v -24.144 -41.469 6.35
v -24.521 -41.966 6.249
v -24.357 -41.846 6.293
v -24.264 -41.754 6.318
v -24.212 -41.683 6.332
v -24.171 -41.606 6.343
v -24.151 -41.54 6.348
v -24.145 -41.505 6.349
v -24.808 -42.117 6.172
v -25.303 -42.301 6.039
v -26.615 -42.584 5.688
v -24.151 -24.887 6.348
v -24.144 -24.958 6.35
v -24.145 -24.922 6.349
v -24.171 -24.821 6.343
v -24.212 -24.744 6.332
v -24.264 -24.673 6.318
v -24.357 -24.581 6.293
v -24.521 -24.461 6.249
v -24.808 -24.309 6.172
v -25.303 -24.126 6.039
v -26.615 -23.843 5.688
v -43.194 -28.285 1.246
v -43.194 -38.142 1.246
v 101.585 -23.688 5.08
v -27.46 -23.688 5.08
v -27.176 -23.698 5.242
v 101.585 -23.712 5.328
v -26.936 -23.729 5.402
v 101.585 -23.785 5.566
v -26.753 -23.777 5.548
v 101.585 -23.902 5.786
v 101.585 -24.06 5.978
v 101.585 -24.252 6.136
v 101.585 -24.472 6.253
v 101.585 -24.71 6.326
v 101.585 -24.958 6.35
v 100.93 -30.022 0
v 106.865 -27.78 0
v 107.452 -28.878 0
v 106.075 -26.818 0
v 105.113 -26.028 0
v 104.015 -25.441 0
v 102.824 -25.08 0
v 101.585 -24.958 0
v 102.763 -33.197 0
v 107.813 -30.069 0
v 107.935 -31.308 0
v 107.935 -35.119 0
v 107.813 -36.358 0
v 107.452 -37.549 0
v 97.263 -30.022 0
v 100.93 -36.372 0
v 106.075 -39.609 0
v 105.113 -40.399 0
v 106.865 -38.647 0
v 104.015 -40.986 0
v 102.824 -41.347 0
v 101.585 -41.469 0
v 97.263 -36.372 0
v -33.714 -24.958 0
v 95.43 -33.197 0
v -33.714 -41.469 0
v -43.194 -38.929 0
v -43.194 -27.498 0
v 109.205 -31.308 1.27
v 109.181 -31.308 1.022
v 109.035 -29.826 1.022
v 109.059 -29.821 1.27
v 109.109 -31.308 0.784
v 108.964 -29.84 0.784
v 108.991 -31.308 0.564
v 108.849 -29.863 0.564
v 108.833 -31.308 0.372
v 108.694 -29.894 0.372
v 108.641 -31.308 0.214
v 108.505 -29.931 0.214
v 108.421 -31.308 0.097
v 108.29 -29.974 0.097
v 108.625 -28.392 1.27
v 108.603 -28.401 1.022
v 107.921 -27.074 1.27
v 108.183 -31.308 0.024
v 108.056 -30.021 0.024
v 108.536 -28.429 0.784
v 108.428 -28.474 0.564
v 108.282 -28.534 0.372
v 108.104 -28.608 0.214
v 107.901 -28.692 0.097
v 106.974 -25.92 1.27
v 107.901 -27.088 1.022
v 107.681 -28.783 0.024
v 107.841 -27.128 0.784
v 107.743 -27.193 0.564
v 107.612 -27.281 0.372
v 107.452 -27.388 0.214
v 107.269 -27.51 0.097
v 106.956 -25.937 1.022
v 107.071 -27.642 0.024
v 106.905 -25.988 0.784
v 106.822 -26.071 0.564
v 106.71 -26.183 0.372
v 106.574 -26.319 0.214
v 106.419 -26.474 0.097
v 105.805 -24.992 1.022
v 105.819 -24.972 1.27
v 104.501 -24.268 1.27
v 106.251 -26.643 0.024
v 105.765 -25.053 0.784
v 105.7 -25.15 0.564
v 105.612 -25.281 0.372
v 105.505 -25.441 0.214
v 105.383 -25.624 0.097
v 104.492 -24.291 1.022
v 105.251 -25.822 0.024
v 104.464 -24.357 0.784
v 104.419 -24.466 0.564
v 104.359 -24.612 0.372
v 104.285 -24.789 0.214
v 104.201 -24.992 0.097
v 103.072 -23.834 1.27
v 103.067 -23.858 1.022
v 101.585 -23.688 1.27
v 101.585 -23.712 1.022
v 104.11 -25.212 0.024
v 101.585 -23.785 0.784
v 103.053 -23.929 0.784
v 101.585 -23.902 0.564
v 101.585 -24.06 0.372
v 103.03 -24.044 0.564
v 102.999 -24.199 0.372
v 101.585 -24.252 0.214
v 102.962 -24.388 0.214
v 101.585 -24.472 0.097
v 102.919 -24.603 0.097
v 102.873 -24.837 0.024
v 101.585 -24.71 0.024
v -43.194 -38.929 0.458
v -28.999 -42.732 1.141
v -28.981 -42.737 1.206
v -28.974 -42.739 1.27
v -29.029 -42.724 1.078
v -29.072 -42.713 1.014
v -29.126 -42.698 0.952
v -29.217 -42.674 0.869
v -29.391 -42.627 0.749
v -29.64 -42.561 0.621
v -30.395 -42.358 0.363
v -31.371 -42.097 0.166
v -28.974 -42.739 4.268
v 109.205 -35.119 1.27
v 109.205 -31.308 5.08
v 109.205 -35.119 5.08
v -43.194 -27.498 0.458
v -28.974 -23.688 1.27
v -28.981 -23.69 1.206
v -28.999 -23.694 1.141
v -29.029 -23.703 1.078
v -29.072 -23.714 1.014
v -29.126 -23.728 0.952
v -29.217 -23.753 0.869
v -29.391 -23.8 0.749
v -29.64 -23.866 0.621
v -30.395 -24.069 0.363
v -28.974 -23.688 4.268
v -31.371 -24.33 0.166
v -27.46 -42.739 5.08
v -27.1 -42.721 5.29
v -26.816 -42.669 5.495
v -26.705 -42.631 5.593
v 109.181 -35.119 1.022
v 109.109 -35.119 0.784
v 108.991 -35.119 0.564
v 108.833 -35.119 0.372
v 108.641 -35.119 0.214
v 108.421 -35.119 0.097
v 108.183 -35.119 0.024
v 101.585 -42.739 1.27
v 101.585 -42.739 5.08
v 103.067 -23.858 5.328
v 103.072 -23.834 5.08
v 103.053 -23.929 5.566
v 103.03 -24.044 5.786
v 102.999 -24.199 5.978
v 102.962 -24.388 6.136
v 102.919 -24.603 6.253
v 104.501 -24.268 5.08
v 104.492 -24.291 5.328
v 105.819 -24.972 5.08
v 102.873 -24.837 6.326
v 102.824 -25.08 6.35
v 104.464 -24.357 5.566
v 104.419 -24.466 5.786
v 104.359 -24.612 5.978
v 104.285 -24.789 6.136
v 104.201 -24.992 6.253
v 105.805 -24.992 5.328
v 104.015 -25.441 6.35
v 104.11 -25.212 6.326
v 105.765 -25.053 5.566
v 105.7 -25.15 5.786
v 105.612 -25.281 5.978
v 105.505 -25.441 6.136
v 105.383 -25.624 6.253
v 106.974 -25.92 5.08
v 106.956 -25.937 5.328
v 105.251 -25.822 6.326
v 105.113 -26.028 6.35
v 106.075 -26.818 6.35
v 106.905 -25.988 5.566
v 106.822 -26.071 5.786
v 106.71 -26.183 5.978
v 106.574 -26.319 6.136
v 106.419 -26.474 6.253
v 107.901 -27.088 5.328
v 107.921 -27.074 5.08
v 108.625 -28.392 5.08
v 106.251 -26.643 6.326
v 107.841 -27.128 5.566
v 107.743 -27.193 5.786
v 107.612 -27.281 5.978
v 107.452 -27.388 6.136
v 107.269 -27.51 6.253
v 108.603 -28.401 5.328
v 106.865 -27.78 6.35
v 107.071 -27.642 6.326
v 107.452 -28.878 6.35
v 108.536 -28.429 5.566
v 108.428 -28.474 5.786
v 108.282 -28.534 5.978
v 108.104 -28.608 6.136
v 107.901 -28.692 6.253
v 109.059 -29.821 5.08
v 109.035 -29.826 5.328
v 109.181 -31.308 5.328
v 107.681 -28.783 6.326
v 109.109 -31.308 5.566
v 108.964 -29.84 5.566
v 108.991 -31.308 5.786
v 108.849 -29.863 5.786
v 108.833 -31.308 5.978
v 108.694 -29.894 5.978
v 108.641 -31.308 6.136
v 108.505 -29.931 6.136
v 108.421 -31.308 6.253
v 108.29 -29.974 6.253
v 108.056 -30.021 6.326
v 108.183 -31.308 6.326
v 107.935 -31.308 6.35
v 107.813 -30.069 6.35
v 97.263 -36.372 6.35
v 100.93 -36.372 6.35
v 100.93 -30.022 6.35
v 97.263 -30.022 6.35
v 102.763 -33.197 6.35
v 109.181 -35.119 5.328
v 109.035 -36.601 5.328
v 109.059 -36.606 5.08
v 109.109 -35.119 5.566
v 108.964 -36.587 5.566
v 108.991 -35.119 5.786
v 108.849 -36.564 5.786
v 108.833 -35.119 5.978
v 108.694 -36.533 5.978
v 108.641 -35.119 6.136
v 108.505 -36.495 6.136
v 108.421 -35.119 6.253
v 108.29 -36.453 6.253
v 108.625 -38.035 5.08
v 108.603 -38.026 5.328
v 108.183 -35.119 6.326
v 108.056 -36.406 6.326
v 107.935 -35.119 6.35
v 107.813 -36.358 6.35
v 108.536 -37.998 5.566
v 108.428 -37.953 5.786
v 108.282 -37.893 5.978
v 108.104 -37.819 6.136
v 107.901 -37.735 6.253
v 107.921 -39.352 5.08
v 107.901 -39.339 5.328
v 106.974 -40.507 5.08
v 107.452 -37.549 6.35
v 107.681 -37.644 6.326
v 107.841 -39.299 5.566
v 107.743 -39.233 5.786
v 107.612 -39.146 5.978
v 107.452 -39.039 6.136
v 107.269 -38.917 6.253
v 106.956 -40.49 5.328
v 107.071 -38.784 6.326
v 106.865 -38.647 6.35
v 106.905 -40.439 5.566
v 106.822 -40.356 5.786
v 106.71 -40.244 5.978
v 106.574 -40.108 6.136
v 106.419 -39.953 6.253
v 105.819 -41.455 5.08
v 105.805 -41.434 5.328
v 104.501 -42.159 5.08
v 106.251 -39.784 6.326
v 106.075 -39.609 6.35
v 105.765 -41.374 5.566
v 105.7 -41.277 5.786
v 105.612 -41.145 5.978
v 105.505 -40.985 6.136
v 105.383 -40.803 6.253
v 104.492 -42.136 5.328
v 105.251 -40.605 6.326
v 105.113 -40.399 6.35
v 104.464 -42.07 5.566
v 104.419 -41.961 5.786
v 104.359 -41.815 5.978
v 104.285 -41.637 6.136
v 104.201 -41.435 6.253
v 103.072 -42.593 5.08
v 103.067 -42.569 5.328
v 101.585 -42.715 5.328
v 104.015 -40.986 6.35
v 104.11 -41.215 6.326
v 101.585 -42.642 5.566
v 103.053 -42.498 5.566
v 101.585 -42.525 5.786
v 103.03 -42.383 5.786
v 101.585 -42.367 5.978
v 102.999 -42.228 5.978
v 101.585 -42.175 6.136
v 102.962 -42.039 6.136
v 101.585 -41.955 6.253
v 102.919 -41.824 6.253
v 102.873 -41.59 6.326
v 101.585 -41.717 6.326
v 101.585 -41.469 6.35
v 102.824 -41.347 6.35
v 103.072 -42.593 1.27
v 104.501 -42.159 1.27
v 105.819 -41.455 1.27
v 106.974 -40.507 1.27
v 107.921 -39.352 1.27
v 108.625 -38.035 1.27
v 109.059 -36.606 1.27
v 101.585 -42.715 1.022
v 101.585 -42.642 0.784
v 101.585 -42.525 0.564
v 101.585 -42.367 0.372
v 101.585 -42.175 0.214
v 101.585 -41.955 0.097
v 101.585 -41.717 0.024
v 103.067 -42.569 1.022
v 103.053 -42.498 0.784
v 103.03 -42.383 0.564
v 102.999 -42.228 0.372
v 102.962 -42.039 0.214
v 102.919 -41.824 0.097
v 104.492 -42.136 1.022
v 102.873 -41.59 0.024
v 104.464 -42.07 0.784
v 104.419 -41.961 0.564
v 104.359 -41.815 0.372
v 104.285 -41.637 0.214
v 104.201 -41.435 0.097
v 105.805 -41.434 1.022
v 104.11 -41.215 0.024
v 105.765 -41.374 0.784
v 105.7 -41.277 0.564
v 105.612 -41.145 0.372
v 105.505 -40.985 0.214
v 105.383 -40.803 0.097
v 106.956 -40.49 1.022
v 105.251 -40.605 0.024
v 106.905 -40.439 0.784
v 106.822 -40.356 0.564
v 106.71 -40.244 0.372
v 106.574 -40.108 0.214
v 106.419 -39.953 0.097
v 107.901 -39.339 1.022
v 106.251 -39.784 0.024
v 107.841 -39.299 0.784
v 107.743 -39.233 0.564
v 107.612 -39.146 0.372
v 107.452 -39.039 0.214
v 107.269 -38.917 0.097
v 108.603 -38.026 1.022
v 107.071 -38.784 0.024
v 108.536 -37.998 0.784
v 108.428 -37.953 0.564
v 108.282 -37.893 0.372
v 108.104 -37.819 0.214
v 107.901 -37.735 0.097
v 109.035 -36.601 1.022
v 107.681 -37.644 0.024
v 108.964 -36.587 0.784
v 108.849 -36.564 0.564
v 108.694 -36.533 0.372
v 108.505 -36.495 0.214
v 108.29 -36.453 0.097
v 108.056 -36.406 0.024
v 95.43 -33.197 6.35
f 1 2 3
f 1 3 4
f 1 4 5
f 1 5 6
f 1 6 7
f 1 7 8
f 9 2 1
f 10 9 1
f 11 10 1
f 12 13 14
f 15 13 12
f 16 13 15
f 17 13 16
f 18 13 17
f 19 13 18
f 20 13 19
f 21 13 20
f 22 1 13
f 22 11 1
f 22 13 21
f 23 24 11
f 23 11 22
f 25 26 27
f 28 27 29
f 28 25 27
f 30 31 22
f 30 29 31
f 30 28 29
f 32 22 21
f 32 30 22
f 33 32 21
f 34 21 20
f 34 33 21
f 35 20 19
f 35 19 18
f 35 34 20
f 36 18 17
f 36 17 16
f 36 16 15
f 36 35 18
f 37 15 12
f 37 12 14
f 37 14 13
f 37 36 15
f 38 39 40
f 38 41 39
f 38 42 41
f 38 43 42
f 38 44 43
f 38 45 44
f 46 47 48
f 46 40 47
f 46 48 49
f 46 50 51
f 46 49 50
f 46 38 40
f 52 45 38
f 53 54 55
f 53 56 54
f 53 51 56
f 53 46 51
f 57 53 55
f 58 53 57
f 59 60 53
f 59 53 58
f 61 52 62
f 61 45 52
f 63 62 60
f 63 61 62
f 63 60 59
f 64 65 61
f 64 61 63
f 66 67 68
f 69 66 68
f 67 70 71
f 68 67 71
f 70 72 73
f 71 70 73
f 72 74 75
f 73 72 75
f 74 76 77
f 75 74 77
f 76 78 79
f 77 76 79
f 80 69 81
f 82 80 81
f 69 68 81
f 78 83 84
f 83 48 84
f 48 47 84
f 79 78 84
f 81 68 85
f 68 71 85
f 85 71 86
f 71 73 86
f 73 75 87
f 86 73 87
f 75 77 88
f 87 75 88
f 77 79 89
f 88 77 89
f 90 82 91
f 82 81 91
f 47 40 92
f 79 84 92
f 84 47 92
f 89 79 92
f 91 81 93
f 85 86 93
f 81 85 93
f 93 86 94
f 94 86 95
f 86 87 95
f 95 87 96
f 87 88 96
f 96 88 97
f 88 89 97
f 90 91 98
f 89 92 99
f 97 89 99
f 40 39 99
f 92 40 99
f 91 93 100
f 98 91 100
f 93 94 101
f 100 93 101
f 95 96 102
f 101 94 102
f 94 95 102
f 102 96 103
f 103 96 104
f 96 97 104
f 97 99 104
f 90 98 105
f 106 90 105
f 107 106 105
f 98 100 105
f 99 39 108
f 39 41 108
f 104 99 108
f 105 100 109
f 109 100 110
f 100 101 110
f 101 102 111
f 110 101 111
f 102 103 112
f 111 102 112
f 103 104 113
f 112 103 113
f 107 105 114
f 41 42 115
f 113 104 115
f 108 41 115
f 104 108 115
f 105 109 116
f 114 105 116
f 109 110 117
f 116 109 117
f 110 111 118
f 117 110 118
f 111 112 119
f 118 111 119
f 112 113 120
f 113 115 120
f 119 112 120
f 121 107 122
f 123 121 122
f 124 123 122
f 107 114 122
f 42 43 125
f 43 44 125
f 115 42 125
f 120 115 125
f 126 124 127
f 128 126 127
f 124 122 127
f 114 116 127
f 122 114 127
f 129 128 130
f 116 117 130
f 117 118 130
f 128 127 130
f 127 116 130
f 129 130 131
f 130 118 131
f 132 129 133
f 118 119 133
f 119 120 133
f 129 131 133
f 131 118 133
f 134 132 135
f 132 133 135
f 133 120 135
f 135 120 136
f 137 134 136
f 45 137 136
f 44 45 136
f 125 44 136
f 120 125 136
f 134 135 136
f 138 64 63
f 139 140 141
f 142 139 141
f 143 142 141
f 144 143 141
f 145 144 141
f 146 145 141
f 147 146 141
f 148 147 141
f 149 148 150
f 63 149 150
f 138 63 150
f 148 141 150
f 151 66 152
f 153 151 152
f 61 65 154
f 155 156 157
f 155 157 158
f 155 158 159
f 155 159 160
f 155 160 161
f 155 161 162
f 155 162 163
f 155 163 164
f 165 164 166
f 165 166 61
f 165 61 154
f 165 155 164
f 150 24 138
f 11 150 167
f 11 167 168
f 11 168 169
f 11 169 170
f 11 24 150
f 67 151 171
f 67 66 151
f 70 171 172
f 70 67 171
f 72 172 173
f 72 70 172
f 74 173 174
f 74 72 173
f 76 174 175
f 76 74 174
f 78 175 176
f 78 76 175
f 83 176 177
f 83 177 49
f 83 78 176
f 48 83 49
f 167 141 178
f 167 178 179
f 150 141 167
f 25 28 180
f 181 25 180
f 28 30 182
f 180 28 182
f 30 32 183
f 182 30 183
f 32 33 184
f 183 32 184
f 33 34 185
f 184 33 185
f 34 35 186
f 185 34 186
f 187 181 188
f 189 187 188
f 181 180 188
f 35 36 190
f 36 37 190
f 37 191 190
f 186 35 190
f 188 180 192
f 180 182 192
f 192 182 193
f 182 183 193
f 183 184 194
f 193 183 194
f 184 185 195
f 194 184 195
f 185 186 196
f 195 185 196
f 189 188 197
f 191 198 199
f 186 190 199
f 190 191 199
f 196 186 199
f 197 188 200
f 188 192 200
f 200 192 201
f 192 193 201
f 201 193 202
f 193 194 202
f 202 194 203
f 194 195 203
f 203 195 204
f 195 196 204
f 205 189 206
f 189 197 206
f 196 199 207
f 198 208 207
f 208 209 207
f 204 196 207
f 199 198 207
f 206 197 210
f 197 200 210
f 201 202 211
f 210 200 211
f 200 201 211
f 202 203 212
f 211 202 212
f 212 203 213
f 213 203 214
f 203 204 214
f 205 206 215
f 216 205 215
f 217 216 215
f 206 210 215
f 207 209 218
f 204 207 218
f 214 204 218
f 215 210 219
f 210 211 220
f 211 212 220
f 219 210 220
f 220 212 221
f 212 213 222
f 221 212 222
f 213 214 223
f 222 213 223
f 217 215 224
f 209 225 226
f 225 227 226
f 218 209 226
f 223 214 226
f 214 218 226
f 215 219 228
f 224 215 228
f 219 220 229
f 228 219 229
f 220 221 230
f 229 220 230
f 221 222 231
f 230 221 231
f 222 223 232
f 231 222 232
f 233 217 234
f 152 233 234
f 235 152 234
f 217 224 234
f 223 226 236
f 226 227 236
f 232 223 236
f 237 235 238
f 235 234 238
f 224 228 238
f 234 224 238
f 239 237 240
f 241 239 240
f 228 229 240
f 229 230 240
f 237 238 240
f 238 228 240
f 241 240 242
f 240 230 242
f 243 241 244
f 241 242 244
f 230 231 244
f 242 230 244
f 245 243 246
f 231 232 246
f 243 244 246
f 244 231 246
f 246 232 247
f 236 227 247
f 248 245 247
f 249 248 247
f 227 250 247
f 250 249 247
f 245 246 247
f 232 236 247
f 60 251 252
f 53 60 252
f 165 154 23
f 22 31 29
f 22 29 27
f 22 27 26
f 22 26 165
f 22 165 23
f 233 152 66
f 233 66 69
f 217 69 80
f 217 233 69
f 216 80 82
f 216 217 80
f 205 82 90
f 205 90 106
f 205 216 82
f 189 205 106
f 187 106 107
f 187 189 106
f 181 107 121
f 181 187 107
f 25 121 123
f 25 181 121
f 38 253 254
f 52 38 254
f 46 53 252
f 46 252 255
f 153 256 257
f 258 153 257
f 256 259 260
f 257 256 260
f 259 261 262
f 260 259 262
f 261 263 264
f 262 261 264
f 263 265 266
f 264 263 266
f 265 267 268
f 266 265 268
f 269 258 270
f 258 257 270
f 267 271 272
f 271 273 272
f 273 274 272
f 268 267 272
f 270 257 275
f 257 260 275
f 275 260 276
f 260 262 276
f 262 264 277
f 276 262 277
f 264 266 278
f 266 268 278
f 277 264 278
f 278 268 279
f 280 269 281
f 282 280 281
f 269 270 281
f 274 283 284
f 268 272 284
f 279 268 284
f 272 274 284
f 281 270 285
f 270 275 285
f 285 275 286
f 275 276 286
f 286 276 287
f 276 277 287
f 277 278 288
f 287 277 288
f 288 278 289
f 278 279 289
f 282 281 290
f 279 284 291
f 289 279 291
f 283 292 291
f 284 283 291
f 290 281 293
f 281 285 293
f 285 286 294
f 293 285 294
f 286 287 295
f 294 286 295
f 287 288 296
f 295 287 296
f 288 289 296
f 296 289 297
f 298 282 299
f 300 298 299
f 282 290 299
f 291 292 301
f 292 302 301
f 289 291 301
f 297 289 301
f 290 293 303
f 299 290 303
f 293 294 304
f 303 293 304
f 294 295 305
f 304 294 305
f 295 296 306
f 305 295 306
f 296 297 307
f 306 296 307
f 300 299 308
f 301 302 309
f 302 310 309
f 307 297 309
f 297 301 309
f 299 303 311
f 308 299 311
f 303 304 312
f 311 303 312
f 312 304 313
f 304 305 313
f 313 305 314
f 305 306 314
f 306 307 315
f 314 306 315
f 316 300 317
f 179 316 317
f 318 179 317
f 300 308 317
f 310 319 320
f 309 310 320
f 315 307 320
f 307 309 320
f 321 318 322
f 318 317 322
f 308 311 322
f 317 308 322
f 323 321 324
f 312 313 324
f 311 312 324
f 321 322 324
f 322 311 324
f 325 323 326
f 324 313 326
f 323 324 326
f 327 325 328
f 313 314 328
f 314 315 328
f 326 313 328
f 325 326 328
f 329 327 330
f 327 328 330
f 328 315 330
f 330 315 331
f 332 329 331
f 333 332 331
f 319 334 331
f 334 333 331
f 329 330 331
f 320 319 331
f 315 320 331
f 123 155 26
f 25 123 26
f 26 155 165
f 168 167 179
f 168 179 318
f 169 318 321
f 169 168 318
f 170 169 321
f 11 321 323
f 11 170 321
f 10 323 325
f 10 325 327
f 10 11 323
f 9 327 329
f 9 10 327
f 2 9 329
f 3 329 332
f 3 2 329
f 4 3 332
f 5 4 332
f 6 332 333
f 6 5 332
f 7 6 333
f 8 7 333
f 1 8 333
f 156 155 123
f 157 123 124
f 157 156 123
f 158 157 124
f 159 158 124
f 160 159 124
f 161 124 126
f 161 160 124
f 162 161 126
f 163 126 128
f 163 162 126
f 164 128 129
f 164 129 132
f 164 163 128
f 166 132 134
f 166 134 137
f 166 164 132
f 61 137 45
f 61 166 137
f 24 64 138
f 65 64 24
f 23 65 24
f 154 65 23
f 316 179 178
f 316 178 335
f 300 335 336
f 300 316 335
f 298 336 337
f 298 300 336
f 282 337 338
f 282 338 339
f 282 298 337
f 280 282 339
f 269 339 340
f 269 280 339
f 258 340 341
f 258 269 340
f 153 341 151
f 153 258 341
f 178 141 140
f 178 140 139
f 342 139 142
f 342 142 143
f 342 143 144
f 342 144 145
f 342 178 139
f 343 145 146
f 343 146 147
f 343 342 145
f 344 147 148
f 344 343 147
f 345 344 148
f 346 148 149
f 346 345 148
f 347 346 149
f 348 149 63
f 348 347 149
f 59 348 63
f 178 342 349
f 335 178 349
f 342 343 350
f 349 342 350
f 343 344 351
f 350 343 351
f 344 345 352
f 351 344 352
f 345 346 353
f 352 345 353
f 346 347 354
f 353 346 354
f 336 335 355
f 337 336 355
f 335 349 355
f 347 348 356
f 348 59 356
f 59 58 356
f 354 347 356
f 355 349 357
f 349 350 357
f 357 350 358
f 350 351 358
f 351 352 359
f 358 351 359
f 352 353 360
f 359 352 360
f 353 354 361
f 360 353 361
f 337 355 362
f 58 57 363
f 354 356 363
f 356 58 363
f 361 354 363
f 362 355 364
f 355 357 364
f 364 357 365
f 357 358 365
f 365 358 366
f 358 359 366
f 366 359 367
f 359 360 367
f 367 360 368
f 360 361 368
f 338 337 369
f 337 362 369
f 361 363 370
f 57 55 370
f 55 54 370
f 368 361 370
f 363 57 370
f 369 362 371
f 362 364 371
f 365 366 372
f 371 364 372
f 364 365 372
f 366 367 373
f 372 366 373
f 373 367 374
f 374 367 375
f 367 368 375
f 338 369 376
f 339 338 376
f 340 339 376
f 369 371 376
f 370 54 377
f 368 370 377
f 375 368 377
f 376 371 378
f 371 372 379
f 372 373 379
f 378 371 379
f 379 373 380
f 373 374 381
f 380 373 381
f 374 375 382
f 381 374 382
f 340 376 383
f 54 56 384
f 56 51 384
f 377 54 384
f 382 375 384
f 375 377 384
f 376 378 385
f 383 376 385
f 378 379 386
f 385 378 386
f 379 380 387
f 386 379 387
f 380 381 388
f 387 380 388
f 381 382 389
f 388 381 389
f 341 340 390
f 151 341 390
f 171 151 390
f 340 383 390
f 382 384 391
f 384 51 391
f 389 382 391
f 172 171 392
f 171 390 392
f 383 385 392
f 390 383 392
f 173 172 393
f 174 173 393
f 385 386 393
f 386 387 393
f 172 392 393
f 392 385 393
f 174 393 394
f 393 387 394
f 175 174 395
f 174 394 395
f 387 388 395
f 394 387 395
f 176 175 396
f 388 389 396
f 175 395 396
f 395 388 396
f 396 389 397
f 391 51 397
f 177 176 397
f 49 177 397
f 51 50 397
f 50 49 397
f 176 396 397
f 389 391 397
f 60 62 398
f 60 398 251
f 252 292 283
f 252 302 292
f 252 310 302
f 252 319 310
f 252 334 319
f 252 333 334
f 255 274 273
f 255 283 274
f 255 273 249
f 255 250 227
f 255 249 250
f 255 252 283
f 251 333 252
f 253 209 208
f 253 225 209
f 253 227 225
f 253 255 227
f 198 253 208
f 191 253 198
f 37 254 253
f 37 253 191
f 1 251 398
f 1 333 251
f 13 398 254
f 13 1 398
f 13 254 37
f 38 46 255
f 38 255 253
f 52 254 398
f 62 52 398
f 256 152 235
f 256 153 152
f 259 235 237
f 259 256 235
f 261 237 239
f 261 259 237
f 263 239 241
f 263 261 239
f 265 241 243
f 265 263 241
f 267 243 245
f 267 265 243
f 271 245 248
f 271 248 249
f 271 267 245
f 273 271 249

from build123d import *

# Parameters (mm, degrees)
F0_W      = 11.3603360951
F0_H      = 3.4401938319
F1_DEPTH  = 6.35
F2_DEPTH  = 15.61084
F3_DEPTH  = 141.03858
F4_R      = 7.62
F5_R      = 7.62
F6_SIZE2  = 5.1044321158
F6_SIZE   = 19.05
F7_SIZE2  = 14.2191135768
F7_SIZE   = 3.81
F8_SIZE2  = 14.2191135768
F8_SIZE   = 3.81
F9_R      = 1.27
F10_R     = 1.27
F13_DEPTH = 25.4
F14_SIZE  = 0.762
F15_SIZE  = 0.762


with BuildPart() as f1:
    # F0 (on Top) → F1 (new body)
    with BuildSketch(Plane.XY):
        with Locations((-37.5133920461, -25.4080276936)):
            Rectangle(F0_W, F0_H)
    extrude(amount=F1_DEPTH)

    # F2 (add): a face of the model
    f2_faces = [f1.faces().sort_by_distance(p)[0] for p in [
        (-37.5133920461, -27.1281246096, 3.175),
    ]]
    extrude(f2_faces, amount=F2_DEPTH)

    # F3 (add): a face of the model
    f3_faces = [f1.faces().sort_by_distance(p)[0] for p in [
        (-31.8332239985, -33.2134476936, 3.175),
    ]]
    extrude(f3_faces, amount=F3_DEPTH)

    # F4
    f4_edges = [f1.edges().sort_by_distance(p)[0] for p in [
        (109.205356, -42.738965, 3.175),
    ]]
    fillet(f4_edges, radius=F4_R)

    # F5
    f5_edges = [f1.edges().sort_by_distance(p)[0] for p in [
        (109.205356, -23.687931, 3.175),
    ]]
    fillet(f5_edges, radius=F5_R)

    # F6
    f6_edges = [f1.edges().sort_by_distance(p)[0] for p in [
        (-43.19356, -33.213448, 6.35),
    ]]
    chamfer(f6_edges, length=F6_SIZE, length2=F6_SIZE2)

    # F7
    f7_edges = [f1.edges().sort_by_distance(p)[0] for p in [
        (-43.19356, -23.687931, 0.622784),
    ]]
    f7_side = f1.faces().sort_by_distance((-43.19356, -33.213448, 0.622784))[0]
    chamfer(f7_edges, length=F7_SIZE, length2=F7_SIZE2, reference=f7_side)

    # F8
    f8_edges = [f1.edges().sort_by_distance(p)[0] for p in [
        (-43.19356, -42.738965, 0.622784),
    ]]
    chamfer(f8_edges, length=F8_SIZE, length2=F8_SIZE2)

    # F9
    f9_edges = [f1.edges().sort_by_distance(p)[0] for p in [
        (38.720898, -42.738965, 6.35),
    ]]
    fillet(f9_edges, radius=F9_R)

    # F10
    f10_edges = [f1.edges().sort_by_distance(p)[0] for p in [
        (36.305455, -42.738965, 0),
    ]]
    fillet(f10_edges, radius=F10_R)

    # F12 (on face) → F13 (cut)
    with BuildSketch(Plane.XY.offset(6.35)):
        Polygon((99.096596241, -36.3724566996), (100.9298735347, -36.3724566996), (102.7631508283, -33.1971272826), (100.9298735347, -30.0217978656), (97.2633189473, -30.0217978656), (95.4300416537, -33.1971272826), (97.2633189473, -36.3724566996), align=None)
    extrude(amount=-F13_DEPTH, mode=Mode.SUBTRACT)

    # F14
    f14_edges = [f1.edges().sort_by_distance(p)[0] for p in [
        (-36.084003, -40.833965, 3.150568),
    ]]
    chamfer(f14_edges, length=F14_SIZE)

    # F15
    f15_edges = [f1.edges().sort_by_distance(p)[0] for p in [
        (-36.084003, -25.592931, 3.150568),
    ]]
    chamfer(f15_edges, length=F15_SIZE)


solid = f1.part
